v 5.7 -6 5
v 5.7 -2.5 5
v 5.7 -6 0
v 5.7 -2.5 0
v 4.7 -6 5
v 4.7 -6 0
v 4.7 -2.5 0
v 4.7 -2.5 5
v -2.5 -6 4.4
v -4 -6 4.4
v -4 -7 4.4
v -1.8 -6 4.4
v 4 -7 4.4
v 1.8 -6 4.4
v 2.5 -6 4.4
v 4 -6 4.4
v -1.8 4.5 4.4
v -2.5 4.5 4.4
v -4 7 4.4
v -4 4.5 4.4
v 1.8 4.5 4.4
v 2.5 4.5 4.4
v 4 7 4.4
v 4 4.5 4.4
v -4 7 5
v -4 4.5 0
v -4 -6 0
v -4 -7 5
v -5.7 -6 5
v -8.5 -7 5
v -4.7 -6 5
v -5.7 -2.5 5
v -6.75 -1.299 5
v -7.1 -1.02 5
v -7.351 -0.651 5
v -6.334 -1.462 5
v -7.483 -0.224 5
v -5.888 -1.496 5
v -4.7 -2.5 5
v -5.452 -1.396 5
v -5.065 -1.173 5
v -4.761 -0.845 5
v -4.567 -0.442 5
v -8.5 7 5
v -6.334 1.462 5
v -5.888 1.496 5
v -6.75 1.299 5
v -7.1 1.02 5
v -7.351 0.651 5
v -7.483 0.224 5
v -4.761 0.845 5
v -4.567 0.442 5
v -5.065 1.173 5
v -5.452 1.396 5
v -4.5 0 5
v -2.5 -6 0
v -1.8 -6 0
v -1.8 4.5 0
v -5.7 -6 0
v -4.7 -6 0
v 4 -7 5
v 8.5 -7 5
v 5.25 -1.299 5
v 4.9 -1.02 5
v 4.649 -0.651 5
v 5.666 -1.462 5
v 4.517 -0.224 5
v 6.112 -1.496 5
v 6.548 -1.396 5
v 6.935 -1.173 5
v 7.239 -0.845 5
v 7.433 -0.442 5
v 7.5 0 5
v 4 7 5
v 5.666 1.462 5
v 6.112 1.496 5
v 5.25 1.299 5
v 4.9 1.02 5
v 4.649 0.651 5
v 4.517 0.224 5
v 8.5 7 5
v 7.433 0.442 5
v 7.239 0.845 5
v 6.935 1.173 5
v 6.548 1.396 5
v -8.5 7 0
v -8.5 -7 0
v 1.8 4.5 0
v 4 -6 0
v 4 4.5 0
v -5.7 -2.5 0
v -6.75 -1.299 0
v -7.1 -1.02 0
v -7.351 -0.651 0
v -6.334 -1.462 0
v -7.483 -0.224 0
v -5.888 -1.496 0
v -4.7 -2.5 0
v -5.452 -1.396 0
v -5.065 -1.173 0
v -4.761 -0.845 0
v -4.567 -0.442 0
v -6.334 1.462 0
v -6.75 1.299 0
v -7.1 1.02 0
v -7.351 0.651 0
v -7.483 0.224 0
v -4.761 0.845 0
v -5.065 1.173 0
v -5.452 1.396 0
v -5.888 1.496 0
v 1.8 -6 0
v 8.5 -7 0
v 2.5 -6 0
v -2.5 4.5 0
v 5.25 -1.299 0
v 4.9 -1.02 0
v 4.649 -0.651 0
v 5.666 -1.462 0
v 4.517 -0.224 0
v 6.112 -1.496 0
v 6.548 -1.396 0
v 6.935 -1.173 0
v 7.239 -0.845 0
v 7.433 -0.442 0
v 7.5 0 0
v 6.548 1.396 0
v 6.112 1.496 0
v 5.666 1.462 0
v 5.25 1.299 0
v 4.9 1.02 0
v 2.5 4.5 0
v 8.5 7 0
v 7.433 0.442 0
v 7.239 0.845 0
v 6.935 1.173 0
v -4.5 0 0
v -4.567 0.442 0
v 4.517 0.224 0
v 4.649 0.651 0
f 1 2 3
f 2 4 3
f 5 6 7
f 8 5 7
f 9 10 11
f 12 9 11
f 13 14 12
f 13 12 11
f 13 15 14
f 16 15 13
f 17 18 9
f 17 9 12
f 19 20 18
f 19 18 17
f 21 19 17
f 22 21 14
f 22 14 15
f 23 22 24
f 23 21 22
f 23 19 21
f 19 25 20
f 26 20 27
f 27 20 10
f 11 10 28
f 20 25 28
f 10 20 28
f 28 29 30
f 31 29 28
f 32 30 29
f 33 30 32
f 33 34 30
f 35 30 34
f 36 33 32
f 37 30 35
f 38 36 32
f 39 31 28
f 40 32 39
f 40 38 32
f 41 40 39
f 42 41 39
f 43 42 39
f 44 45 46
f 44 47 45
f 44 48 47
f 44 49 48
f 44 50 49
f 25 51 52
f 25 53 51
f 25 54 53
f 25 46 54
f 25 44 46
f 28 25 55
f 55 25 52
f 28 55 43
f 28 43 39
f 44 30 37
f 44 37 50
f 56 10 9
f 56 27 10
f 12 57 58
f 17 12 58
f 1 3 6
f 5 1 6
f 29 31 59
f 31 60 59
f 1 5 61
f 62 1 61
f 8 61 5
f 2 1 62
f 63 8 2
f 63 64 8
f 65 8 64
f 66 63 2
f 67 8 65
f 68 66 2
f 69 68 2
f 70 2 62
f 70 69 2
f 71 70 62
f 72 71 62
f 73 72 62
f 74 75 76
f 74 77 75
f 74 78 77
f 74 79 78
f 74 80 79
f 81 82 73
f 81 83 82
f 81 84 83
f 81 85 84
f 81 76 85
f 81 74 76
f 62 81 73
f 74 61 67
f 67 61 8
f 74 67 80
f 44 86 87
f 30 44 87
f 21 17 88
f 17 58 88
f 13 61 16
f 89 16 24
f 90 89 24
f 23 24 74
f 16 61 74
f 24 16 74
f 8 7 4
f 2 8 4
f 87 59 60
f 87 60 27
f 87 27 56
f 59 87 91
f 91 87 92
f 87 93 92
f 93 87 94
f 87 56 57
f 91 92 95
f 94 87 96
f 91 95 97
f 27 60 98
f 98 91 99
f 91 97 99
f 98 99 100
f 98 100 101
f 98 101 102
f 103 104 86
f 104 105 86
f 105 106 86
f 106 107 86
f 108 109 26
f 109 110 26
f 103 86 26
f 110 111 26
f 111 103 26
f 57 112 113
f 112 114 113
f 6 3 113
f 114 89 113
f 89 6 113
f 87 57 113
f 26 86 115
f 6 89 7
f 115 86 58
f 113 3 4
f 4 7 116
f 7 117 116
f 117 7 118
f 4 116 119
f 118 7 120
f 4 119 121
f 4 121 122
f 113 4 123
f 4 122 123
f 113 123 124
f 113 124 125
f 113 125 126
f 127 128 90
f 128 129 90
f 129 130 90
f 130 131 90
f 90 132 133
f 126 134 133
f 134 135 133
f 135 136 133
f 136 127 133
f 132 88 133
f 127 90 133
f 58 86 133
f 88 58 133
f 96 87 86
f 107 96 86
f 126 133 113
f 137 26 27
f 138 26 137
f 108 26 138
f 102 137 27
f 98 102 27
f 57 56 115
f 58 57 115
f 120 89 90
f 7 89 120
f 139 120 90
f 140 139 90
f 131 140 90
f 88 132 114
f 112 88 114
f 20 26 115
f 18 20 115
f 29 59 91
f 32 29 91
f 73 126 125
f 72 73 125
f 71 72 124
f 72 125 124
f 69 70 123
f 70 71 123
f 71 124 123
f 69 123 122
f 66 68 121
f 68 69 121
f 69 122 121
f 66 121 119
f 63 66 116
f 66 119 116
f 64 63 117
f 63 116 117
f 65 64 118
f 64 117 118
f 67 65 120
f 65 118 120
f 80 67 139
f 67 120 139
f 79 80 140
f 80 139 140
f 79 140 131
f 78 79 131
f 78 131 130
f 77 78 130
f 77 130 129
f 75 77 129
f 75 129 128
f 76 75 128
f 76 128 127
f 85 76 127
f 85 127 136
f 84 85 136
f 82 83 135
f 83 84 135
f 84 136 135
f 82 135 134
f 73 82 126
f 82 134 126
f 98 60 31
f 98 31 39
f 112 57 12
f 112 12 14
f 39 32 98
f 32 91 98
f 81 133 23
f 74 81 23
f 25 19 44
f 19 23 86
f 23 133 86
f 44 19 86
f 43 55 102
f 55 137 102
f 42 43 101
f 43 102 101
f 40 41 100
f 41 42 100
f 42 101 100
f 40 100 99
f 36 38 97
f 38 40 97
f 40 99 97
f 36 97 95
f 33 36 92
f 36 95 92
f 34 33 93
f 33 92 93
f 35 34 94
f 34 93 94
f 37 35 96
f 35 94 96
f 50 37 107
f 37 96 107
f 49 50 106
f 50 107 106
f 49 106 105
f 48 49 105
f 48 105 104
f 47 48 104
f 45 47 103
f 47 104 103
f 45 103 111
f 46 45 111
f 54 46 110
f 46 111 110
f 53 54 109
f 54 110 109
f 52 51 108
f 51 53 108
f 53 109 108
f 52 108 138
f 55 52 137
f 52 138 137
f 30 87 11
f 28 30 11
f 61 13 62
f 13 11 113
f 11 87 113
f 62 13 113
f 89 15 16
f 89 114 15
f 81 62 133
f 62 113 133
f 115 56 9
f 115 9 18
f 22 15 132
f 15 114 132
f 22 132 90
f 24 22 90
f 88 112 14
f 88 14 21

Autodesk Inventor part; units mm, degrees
ref_plane "YZ Plane" through (0, 0, 0) normal (1, 0, 0) x (0, 1, 0)
ref_plane "XZ Plane" through (0, 0, 0) normal (0, 1, 0) x (-1, 0, 0)
ref_plane "XY Plane" through (0, 0, 0) normal (0, 0, 1) x (1, 0, 0)
sketch "スケッチ1" plane through (0, 0, 0) normal (0, 0, 1) x (1, 0, 0)
  line L0 (8.5, 7) -> (-8.5, 7)
  line L1 (-8.5, 7) -> (-8.5, -7)
  line L2 (-8.5, -7) -> (8.5, -7)
  line L3 (8.5, -7) -> (8.5, 7)
  line L4 (8.5, 7) -> (-8.5, -7) construction
  line L5 (-8.5, 7) -> (8.5, -7) construction
  circle A0 centre (-6, 0) radius 1.5
  circle A1 centre (6, 0) radius 1.5
  line L6 (-8.5, -6) -> (8.5, -6)
  line L7 (-8.5, 4.5) -> (8.5, 4.5)
  line L8 (-4, -7) -> (-4, 7)
  line L9 (4, -7) -> (4, 7)
  line L10 (2.5, -6) -> (2.5, 4.5)
  line L11 (-2.5, -6) -> (-2.5, 4.5)
  line L12 (1.8, -6) -> (1.8, 4.5)
  line L13 (-1.8, -6) -> (-1.8, 4.5)
  point P0 (0, 0)
  point P1 (-4, -6)
  point P2 (-4, 4.5)
  point P3 (4, -6)
  point P4 (4, 4.5)
  dimension "d0" = 17
  dimension "d1" = 14
  dimension "d2" = 3
  dimension "d3" = 3
  dimension "d4" = 2.5
  dimension "d5" = 4.5
  dimension "d6" = 4.5
  dimension "d7" = 1.5
  dimension "d8" = 1.5
  dimension "d9" = 1
  dimension "d16" = 0.7
  dimension "d17" = 0.7
extrude "押し出し1" add sketch "スケッチ1" along normal blind 5 contours L3 L7 L9 L0 | L9 L7 L8 L0 | L3 L6 L9 L7 | L8 L7 L1 L0 | L3 L2 L9 L6 | L8 L6 L1 L7 | L10 L6 L12 L7 | L9 L2 L8 L6 | L7 L13 L6 L11 | L8 L2 L1 L6
sketch "スケッチ2" plane through (0, 0, 5) normal (0, 0, 1) x (1, 0, 0)
  line L0 (8.5, 7) -> (-8.5, 7) projected
  line L1 (0, 7) -> (-4, 7)
  line L2 (-4, 7) -> (-4, -7)
  line L3 (-8.5, -7) -> (8.5, -7) projected
  line L4 (-4, -7) -> (4, -7)
  line L5 (4, -7) -> (4, 7)
  line L6 (4, 7) -> (0, 7)
  point P0 (0, 0)
  dimension "d12" = 4
  dimension "d13" = 8
extrude "押し出し2" cut sketch "スケッチ2" against normal blind 0.6
sketch "スケッチ3" plane through (0, 0, 0) normal (0, 0, -1) x (-1, 0, 0)
  line L0 (4.7, -6) -> (4.7, -2.5)
  line L1 (4, -6) -> (4, 4.5) projected
  line L2 (4.7, -6) -> (5.7, -6)
  line L3 (5.7, -6) -> (5.7, -2.5)
  line L4 (5.7, -2.5) -> (4.7, -2.5)
  line L5 (-4.7, -6) -> (-4.7, -2.5)
  line L6 (-4.7, -2.5) -> (-5.7, -2.5)
  line L7 (-5.7, -2.5) -> (-5.7, -6)
  line L8 (-5.7, -6) -> (-4.7, -6)
  line L9 (8.5, -7) -> (-8.5, -7) projected
  point P0 (0, 0)
  point P1 (5.2, -6)
  dimension "d18" = 3.5
  dimension "d19" = 0.7
  dimension "d20" = 1
  dimension "d21" = 1
  dimension "d24" = 1
  dimension "d25" = 1
  dimension "d26" = 3.5
extrude "押し出し3" cut sketch "スケッチ3" against normal blind 10
properties part number "greiper_TPU" material "ゴム、シリコーン"
